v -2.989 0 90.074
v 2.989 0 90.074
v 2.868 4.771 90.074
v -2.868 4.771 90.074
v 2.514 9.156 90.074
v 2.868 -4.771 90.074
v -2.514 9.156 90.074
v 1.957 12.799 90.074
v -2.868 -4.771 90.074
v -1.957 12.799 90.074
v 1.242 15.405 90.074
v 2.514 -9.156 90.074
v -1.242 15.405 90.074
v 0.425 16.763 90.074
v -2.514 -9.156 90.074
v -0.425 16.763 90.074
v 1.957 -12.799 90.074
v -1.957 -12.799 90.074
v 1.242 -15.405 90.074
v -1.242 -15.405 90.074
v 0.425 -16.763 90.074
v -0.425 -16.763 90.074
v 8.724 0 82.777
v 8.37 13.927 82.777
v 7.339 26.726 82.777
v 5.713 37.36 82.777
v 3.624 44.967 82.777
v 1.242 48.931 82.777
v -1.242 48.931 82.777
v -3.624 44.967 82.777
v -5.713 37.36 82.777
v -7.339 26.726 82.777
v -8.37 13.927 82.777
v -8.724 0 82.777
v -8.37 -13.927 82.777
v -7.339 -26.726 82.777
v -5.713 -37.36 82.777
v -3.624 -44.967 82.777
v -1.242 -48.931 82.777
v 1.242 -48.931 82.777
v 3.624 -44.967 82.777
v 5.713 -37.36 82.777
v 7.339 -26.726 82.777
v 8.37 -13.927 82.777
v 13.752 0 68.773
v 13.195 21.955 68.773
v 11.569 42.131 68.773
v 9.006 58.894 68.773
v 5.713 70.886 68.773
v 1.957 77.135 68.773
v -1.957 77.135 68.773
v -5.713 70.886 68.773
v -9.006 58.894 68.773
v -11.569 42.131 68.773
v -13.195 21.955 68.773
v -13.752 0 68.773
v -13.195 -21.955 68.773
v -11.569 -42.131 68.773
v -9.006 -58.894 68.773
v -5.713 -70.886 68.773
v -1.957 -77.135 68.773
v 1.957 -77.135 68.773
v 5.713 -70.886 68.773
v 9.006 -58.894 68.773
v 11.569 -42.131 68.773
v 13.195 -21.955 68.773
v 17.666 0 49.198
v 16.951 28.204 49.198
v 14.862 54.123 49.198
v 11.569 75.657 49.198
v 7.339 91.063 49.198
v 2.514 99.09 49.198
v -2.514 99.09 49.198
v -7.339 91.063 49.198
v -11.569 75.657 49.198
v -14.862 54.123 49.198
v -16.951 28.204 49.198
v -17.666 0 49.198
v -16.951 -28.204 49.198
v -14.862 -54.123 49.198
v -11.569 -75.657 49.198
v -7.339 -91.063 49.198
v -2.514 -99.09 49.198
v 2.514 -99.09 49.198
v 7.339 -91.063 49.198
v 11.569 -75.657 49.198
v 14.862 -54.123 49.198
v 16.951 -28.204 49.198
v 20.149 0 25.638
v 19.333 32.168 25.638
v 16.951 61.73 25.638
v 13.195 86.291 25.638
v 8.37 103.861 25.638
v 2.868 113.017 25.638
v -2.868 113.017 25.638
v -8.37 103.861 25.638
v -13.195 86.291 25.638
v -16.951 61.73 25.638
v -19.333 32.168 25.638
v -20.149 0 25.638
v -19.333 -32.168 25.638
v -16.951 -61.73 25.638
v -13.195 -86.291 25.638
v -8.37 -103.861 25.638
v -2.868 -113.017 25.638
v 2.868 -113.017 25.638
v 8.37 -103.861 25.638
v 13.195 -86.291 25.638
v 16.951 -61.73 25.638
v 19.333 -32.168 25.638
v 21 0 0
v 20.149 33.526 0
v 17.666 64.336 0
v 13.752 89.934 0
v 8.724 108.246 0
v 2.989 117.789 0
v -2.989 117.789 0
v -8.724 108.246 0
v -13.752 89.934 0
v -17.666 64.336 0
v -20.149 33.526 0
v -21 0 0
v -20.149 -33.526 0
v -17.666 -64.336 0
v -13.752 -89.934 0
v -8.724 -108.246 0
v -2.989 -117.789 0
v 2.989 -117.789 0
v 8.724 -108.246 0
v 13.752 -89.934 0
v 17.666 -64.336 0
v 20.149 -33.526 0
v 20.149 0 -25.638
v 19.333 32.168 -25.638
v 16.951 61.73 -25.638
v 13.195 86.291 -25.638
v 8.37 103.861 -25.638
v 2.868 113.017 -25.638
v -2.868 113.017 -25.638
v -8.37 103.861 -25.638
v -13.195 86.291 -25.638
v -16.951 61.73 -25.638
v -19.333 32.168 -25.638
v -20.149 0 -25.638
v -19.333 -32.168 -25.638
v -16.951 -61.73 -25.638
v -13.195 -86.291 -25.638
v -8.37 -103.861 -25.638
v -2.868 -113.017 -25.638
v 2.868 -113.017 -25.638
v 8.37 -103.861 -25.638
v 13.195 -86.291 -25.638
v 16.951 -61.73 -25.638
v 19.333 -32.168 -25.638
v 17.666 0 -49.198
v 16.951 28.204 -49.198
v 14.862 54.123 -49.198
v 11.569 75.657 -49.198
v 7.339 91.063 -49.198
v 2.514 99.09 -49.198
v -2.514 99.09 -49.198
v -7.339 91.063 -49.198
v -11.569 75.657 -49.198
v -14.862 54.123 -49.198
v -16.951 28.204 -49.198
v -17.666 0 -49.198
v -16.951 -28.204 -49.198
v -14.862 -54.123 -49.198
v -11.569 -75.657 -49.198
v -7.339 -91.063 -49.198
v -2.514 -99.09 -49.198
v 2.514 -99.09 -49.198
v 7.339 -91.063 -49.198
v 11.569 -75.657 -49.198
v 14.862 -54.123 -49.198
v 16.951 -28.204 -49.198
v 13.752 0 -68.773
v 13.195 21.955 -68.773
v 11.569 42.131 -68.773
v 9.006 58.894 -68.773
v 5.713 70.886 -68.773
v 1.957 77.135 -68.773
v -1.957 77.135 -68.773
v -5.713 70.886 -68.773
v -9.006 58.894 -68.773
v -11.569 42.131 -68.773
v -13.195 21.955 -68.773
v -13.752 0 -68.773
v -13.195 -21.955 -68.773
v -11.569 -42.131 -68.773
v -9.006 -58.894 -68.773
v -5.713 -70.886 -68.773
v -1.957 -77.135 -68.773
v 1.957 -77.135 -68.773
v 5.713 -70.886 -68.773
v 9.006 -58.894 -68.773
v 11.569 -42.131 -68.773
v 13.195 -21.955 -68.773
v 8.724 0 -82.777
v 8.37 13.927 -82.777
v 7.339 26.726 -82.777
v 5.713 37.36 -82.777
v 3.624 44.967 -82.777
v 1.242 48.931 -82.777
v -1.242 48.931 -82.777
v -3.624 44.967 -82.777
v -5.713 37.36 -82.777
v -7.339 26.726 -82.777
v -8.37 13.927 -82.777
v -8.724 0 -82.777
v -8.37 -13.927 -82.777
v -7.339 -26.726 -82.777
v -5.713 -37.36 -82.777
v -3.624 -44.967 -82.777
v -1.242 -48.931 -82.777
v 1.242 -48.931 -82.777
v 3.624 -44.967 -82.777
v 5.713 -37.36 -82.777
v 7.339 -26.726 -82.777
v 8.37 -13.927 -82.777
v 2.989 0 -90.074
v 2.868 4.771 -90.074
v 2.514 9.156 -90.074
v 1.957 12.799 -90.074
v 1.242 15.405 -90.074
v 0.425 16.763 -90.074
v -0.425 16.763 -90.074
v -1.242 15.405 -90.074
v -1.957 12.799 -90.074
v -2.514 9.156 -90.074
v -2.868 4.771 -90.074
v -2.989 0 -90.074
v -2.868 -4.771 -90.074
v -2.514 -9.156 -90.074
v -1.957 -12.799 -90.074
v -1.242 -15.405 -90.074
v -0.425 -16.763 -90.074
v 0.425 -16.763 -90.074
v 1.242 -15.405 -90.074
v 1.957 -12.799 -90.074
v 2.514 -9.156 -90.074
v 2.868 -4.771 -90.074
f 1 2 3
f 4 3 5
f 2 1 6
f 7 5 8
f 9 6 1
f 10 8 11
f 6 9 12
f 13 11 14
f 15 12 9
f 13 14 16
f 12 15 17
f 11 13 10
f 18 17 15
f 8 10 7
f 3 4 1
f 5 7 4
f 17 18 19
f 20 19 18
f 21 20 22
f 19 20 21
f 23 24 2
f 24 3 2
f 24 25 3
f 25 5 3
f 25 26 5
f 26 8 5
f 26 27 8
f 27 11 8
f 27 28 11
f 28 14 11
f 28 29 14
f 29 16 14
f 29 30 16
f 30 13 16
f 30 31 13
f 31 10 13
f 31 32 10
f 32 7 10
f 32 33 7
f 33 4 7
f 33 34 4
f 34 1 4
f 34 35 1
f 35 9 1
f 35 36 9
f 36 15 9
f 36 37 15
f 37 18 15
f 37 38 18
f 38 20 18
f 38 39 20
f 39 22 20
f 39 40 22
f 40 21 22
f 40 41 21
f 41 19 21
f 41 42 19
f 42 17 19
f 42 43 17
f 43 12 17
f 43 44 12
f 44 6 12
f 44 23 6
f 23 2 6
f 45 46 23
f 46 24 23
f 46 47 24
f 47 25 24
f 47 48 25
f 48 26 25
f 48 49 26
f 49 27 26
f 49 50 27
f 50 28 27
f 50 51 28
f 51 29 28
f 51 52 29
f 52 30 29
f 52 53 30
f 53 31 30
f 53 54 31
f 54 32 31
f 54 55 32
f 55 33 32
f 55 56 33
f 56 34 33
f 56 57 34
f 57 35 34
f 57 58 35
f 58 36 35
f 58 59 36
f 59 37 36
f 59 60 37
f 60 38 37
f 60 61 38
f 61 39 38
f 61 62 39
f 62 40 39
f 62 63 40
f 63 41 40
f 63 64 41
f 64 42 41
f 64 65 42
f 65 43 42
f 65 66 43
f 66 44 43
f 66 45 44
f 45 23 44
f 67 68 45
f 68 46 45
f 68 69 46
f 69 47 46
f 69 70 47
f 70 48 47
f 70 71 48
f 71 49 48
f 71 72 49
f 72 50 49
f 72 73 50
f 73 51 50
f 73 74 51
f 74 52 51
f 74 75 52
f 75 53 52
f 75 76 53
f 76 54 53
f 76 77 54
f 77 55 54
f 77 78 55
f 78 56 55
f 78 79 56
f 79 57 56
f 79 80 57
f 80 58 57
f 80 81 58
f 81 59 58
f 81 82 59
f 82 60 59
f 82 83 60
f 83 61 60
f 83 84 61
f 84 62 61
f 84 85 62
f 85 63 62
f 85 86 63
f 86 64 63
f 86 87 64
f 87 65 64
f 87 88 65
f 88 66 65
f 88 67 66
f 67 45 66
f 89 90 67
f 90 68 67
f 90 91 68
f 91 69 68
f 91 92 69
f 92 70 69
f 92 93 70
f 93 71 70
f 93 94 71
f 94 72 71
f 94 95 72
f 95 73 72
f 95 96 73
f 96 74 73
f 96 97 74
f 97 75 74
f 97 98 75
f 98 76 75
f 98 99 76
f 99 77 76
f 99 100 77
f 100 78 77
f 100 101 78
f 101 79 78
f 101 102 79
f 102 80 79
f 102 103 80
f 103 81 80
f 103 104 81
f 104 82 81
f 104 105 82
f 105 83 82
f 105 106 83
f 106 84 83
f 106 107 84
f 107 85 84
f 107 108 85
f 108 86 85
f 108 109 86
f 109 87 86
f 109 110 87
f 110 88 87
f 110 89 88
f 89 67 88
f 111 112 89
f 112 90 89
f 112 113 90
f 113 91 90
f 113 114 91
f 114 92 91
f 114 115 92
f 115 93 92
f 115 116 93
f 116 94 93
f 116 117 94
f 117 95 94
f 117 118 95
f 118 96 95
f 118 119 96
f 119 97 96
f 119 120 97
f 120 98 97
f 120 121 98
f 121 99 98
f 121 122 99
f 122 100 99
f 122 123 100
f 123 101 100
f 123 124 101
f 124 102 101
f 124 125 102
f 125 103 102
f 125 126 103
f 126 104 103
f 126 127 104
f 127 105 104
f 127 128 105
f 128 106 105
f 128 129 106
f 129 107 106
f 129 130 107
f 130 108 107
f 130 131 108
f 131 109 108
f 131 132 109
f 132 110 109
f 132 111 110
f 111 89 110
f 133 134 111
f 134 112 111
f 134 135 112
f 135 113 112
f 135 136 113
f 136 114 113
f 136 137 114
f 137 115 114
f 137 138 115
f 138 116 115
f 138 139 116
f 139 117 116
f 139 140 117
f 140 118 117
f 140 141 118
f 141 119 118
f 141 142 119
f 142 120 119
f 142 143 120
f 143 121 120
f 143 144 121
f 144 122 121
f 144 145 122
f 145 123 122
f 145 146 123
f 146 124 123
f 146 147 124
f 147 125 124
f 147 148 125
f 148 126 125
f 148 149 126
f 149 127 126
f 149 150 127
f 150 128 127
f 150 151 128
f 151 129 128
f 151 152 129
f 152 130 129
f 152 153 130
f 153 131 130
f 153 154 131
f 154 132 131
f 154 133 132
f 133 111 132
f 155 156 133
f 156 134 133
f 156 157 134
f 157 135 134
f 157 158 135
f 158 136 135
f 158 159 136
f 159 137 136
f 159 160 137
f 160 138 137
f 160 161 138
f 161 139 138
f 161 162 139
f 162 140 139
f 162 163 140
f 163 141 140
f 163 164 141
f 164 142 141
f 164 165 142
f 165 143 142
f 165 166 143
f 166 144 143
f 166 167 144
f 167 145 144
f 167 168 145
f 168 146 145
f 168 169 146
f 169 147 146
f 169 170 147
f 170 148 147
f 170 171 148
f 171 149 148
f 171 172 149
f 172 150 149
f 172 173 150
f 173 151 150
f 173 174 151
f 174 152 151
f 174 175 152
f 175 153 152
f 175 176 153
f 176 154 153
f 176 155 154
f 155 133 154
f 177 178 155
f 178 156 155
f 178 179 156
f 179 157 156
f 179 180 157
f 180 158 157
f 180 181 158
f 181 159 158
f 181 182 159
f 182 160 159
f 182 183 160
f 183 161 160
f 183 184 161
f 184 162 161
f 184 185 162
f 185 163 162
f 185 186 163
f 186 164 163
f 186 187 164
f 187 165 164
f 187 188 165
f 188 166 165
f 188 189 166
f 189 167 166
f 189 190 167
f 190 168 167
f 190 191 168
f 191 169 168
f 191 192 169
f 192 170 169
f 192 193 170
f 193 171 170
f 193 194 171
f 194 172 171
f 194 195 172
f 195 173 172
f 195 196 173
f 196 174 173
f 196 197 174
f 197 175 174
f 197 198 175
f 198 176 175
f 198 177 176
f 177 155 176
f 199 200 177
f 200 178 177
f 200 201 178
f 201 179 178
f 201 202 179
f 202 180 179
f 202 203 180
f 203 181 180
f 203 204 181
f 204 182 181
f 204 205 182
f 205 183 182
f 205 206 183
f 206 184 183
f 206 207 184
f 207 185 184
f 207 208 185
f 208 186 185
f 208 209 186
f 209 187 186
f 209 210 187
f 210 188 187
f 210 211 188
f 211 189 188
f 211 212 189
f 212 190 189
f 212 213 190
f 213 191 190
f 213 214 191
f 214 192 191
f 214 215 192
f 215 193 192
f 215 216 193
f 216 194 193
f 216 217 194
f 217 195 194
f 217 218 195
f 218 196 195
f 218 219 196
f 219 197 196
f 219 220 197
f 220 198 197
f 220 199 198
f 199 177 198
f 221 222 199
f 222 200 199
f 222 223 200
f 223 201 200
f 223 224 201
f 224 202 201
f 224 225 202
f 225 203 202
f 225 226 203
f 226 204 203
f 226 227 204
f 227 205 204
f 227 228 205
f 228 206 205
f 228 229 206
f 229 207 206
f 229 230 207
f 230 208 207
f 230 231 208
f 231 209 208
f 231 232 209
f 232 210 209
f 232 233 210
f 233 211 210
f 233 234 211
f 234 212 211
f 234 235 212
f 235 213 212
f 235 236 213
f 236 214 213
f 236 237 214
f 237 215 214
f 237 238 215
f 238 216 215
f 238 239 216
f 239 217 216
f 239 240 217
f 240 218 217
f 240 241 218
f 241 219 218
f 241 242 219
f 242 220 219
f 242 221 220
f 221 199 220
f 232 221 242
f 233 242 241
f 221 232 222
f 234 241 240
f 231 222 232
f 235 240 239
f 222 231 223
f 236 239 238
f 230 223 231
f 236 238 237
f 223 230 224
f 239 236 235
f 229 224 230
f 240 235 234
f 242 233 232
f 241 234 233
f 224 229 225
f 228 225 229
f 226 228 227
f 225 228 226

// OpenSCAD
// Generated by SolidPython 1.0.1 on 2020-07-29 00:46:46


scale(v = [3, 17, 13]) {
	sphere(r = 7);
}
/***********************************************
*********      SolidPython code:      **********
************************************************
 
# import packages: SolidPython
from solid import *
from solid.utils import *
from itertools import chain, combinations, permutations


class Resize:

    def __init__(self, scad_file):
        self.scad_file = scad_file
        #self.scad_file = import_scad(scad_file)
        # cone/cylinder param:
        self.r1 = 0
        self.r2 = 0
        self.h = 0
        # rectangular prism param:
        self.w = 0
        self.l = 0
        # ellipse param:
        self.r = 0

    # import OpenScad code (file name corresponds to shape)


    # classify shape + parameters
    def assign(self, param1, param2, param3):
        if self.scad_file == 'cone.scad':
            self.r1 = param1
            self.r2 = param2
            self.h = param3
        elif self.scad_file == 'cylinder.scad':
            self.r1 = param1
            self.r2 = param2
            self.h = param3
        elif self.scad_file == 'rectangularPrism.scad':
            self.h = param1
            self.l = param2
            self.w = param3
        else:
            self.r = param1
            self.h = param2

    # resize parameters
    def iterate(self):
        x = range(3, 20, 2)
        i = 1
        if self.scad_file == 'cone.scad':
            tempList = list(permutations(x, 2))
            for temp in tempList:
                param1 = temp[0]
                param2 = temp[1]
                filepath = 'produced_scad_files/' + 'cone' + str(param1) + '_' + str(param2) + '_' + '.scad'
                scad_render_to_file(cylinder(h=param1, r1=param2, r2=0), filepath)

        elif self.scad_file == 'cylinder.scad':
            tempList = list(permutations(x, 3))
            for temp in tempList:
                param1 = temp[0]
                param2 = temp[1]
                filepath = 'produced_scad_files/' + 'cylinder' + str(param1) + '_' + str(param2) + '_' + '.scad'
                scad_render_to_file(cylinder(h=param1, r1=param2, r2=param2), filepath)

        elif self.scad_file == 'rectangularPrism.scad':
            tempList = list(permutations(x, 3))
            for temp in tempList:
                param1 = temp[0]
                param2 = temp[1]
                param3 = temp[2]
                filepath = 'produced_scad_files/' + 'rectangularPrism' + str(param1) + '_' + str(param2) + '_' + str(
                    param3) + '.scad'
                scad_render_to_file(cube(size=(param1, param2, param3)), filepath)

        elif self.scad_file == 'ellipse.scad':
            tempList = list(permutations(x, 4))
            for temp in tempList:
                param1 = temp[0]
                param2 = temp[1]
                param3 = temp[2]
                param4 = temp[3]
                filepath = 'produced_scad_files/' + 'ellipse' + str(param1) + '_' + str(param2) + '_' + str(param3) + '_' + str(param4) + '.scad'
                scad_render_to_file(scale([param1, param2, param3])(sphere(r=param4)), filepath)

    def render_to_scadfile(self):
        scad_render_to_file(scad, 'example.scad') 
 
************************************************/
